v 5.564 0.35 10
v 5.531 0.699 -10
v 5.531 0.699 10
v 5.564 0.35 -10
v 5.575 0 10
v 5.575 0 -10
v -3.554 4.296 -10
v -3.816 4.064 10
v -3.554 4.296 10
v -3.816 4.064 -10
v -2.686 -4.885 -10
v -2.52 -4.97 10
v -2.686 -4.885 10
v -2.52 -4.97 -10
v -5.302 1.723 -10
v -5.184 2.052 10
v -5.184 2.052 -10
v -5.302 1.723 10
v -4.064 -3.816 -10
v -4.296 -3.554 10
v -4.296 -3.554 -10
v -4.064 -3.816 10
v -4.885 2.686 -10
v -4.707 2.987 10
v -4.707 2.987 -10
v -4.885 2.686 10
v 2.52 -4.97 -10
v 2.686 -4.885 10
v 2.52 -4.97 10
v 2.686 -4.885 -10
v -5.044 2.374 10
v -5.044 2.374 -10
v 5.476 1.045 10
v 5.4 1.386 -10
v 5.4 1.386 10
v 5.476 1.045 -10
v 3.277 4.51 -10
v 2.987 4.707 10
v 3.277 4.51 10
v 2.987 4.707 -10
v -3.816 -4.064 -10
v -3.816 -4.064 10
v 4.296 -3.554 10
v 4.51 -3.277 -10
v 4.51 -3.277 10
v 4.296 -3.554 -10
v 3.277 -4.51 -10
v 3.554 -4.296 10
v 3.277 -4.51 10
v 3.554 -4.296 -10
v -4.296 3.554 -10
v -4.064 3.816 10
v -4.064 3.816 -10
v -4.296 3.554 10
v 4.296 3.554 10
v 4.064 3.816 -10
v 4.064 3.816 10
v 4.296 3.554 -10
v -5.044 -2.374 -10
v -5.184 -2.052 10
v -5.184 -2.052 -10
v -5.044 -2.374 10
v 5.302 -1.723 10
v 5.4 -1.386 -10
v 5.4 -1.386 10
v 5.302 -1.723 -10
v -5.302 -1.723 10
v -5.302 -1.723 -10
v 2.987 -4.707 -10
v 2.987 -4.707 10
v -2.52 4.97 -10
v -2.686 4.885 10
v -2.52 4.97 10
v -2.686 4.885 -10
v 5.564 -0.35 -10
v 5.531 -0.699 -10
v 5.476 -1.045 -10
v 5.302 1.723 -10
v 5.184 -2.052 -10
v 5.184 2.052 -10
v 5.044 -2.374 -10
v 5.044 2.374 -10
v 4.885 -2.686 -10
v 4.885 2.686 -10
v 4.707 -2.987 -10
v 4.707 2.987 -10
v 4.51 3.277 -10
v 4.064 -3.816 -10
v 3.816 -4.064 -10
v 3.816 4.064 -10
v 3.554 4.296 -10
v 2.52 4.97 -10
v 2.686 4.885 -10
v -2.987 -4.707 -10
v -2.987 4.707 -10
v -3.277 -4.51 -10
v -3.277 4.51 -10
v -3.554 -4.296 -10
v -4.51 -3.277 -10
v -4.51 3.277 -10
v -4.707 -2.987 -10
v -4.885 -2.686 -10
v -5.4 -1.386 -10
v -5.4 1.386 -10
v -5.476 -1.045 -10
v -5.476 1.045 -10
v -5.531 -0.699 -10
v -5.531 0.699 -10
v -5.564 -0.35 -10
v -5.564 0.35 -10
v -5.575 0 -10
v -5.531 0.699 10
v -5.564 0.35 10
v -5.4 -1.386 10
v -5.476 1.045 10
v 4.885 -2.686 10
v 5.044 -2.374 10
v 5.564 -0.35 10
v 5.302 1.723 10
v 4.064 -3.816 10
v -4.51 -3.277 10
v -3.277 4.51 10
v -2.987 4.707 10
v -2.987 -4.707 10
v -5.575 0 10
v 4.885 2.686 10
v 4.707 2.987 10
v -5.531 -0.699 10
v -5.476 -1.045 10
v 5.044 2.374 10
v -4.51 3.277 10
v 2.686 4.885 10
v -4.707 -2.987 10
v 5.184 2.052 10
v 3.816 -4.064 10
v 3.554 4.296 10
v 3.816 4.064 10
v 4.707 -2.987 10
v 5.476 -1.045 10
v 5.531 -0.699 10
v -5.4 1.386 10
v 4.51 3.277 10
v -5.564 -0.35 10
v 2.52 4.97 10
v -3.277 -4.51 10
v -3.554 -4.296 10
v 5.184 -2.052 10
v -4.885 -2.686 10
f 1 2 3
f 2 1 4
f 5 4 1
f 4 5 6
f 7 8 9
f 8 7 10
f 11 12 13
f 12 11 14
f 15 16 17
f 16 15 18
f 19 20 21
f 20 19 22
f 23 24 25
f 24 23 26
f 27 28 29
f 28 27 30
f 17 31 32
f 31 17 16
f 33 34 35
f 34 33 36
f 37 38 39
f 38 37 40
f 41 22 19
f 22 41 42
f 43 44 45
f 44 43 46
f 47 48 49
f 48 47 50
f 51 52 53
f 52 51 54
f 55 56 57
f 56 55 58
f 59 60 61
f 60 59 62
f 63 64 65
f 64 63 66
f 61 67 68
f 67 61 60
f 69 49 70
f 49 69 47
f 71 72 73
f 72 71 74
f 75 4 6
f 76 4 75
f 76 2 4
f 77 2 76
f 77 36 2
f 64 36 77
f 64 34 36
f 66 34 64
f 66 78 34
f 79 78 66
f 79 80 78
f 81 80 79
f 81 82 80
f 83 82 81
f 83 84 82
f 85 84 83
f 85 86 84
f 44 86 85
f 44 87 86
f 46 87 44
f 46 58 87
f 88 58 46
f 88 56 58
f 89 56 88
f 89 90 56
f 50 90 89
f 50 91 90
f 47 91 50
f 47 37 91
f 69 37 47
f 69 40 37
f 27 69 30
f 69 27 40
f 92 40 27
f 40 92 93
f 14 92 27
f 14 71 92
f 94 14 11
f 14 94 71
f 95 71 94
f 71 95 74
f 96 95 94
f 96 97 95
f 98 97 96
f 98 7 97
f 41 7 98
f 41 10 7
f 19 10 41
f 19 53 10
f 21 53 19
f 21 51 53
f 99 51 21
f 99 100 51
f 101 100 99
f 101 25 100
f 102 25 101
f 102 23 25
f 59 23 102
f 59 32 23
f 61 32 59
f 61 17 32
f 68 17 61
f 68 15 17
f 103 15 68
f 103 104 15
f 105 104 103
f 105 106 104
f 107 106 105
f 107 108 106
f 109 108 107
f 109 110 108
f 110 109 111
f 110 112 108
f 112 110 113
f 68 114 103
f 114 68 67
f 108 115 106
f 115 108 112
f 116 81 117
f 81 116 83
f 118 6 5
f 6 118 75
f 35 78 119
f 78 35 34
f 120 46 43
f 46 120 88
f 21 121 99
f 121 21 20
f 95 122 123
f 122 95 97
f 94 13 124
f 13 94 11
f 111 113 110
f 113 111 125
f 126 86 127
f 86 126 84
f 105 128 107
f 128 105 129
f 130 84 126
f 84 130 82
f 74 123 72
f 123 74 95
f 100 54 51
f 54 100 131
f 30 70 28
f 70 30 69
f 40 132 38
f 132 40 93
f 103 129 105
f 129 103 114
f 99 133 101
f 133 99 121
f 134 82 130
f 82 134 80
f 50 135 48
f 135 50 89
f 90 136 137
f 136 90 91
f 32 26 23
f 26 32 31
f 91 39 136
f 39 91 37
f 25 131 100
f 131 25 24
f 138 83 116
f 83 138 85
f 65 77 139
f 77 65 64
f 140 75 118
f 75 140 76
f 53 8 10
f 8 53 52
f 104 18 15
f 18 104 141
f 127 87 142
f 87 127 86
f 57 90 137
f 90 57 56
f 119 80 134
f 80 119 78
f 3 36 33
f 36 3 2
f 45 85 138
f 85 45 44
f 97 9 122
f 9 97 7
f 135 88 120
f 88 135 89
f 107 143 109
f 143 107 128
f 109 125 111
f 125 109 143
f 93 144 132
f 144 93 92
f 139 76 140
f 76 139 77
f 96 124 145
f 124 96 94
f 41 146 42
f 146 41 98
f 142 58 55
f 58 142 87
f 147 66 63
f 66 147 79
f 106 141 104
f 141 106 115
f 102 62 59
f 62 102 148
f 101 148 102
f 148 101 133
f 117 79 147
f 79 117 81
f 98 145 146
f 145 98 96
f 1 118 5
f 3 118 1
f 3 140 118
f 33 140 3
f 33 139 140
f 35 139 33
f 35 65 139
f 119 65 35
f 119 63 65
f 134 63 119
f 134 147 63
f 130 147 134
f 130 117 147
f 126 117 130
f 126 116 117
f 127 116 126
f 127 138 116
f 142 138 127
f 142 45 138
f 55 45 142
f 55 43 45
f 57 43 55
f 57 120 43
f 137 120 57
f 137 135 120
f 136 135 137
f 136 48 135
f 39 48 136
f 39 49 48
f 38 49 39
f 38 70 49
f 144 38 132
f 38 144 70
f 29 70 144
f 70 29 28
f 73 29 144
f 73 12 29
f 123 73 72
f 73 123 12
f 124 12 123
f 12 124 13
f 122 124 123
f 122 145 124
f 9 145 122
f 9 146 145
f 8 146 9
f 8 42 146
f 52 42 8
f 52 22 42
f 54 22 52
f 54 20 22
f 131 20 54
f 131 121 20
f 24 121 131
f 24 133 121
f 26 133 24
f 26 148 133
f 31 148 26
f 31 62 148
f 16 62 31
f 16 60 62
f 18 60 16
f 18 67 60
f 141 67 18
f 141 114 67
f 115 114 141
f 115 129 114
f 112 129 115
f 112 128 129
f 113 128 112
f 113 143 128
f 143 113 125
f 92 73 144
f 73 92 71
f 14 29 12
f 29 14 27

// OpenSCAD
// file: ../assets/usb-connector/configurations.scad
usbConnector_total_z_size = 16.6;
usbConnector_head_z_size = 2.05;
usbConnector_head_diameter = 13.86;
usbConnector_bottom_part_diameter = 10.65;
usbConnector_bottom_part_flat_size = 9.44;
// file: ../configurations/global.scad
SHOW_FLOPPY_DRIVE = true;
SHOW_BUTTON_ASSETS = true;
SHOW_BUTTON_ON_TOP_ASSETS = false;
SHOW_HOLDER_PIECE = true;
SHOW_8266_FIXATION = true;

// Generics
insert_throw_diameter = 4.25;
insert_throw_length = 6;
throw_m3_diameter = 3.5;
wood_throw_m3_diameter = 3.3;


symfloppy_box_x_size = 120;
symfloppy_box_y_size = 170;
symfloppy_box_z_size = 30;
symfloppy_box_pane_thickness = 4.8;

floppy_y_offset = -6;


facade_throws_margin = 5;
facade_front_round_edges_radius = 5;
housingBorderPiece_border_thickness = 4;


button_y_front_offset = 13;
button_x_spaces = 18;
button_x_center_offset = -15;


holder_piece_x_from_z_offset = 5;
holder_piece_y_centered_holder_piece_gap = 120;


// UsbConnector
usbConnectorThrowEnveloppe_margin = 0.25;
usbConnectorThrowEnveloppe_fn = 100;
// main file
include <../configurations/global.scad>
include <../assets/usb-connector/configurations.scad>


module usbConnectorThrowEnveloppe(
    usbConnector_bottom_part_diameter = usbConnector_bottom_part_diameter,
    usbConnector_bottom_part_flat_size = usbConnector_bottom_part_flat_size,
    margin = usbConnectorThrowEnveloppe_margin,
    length = 20,
    _fn = usbConnectorThrowEnveloppe_fn
) {

    intersection() {
        cylinder(
            d = usbConnector_bottom_part_diameter + (margin * 2), 
            h = length, 
            center = true, 
            $fn = _fn);
        cube([
            usbConnector_bottom_part_diameter + (margin * 2),
            usbConnector_bottom_part_flat_size + (margin * 2),
            length
        ], center = true);
    }

}

usbConnectorThrowEnveloppe();
